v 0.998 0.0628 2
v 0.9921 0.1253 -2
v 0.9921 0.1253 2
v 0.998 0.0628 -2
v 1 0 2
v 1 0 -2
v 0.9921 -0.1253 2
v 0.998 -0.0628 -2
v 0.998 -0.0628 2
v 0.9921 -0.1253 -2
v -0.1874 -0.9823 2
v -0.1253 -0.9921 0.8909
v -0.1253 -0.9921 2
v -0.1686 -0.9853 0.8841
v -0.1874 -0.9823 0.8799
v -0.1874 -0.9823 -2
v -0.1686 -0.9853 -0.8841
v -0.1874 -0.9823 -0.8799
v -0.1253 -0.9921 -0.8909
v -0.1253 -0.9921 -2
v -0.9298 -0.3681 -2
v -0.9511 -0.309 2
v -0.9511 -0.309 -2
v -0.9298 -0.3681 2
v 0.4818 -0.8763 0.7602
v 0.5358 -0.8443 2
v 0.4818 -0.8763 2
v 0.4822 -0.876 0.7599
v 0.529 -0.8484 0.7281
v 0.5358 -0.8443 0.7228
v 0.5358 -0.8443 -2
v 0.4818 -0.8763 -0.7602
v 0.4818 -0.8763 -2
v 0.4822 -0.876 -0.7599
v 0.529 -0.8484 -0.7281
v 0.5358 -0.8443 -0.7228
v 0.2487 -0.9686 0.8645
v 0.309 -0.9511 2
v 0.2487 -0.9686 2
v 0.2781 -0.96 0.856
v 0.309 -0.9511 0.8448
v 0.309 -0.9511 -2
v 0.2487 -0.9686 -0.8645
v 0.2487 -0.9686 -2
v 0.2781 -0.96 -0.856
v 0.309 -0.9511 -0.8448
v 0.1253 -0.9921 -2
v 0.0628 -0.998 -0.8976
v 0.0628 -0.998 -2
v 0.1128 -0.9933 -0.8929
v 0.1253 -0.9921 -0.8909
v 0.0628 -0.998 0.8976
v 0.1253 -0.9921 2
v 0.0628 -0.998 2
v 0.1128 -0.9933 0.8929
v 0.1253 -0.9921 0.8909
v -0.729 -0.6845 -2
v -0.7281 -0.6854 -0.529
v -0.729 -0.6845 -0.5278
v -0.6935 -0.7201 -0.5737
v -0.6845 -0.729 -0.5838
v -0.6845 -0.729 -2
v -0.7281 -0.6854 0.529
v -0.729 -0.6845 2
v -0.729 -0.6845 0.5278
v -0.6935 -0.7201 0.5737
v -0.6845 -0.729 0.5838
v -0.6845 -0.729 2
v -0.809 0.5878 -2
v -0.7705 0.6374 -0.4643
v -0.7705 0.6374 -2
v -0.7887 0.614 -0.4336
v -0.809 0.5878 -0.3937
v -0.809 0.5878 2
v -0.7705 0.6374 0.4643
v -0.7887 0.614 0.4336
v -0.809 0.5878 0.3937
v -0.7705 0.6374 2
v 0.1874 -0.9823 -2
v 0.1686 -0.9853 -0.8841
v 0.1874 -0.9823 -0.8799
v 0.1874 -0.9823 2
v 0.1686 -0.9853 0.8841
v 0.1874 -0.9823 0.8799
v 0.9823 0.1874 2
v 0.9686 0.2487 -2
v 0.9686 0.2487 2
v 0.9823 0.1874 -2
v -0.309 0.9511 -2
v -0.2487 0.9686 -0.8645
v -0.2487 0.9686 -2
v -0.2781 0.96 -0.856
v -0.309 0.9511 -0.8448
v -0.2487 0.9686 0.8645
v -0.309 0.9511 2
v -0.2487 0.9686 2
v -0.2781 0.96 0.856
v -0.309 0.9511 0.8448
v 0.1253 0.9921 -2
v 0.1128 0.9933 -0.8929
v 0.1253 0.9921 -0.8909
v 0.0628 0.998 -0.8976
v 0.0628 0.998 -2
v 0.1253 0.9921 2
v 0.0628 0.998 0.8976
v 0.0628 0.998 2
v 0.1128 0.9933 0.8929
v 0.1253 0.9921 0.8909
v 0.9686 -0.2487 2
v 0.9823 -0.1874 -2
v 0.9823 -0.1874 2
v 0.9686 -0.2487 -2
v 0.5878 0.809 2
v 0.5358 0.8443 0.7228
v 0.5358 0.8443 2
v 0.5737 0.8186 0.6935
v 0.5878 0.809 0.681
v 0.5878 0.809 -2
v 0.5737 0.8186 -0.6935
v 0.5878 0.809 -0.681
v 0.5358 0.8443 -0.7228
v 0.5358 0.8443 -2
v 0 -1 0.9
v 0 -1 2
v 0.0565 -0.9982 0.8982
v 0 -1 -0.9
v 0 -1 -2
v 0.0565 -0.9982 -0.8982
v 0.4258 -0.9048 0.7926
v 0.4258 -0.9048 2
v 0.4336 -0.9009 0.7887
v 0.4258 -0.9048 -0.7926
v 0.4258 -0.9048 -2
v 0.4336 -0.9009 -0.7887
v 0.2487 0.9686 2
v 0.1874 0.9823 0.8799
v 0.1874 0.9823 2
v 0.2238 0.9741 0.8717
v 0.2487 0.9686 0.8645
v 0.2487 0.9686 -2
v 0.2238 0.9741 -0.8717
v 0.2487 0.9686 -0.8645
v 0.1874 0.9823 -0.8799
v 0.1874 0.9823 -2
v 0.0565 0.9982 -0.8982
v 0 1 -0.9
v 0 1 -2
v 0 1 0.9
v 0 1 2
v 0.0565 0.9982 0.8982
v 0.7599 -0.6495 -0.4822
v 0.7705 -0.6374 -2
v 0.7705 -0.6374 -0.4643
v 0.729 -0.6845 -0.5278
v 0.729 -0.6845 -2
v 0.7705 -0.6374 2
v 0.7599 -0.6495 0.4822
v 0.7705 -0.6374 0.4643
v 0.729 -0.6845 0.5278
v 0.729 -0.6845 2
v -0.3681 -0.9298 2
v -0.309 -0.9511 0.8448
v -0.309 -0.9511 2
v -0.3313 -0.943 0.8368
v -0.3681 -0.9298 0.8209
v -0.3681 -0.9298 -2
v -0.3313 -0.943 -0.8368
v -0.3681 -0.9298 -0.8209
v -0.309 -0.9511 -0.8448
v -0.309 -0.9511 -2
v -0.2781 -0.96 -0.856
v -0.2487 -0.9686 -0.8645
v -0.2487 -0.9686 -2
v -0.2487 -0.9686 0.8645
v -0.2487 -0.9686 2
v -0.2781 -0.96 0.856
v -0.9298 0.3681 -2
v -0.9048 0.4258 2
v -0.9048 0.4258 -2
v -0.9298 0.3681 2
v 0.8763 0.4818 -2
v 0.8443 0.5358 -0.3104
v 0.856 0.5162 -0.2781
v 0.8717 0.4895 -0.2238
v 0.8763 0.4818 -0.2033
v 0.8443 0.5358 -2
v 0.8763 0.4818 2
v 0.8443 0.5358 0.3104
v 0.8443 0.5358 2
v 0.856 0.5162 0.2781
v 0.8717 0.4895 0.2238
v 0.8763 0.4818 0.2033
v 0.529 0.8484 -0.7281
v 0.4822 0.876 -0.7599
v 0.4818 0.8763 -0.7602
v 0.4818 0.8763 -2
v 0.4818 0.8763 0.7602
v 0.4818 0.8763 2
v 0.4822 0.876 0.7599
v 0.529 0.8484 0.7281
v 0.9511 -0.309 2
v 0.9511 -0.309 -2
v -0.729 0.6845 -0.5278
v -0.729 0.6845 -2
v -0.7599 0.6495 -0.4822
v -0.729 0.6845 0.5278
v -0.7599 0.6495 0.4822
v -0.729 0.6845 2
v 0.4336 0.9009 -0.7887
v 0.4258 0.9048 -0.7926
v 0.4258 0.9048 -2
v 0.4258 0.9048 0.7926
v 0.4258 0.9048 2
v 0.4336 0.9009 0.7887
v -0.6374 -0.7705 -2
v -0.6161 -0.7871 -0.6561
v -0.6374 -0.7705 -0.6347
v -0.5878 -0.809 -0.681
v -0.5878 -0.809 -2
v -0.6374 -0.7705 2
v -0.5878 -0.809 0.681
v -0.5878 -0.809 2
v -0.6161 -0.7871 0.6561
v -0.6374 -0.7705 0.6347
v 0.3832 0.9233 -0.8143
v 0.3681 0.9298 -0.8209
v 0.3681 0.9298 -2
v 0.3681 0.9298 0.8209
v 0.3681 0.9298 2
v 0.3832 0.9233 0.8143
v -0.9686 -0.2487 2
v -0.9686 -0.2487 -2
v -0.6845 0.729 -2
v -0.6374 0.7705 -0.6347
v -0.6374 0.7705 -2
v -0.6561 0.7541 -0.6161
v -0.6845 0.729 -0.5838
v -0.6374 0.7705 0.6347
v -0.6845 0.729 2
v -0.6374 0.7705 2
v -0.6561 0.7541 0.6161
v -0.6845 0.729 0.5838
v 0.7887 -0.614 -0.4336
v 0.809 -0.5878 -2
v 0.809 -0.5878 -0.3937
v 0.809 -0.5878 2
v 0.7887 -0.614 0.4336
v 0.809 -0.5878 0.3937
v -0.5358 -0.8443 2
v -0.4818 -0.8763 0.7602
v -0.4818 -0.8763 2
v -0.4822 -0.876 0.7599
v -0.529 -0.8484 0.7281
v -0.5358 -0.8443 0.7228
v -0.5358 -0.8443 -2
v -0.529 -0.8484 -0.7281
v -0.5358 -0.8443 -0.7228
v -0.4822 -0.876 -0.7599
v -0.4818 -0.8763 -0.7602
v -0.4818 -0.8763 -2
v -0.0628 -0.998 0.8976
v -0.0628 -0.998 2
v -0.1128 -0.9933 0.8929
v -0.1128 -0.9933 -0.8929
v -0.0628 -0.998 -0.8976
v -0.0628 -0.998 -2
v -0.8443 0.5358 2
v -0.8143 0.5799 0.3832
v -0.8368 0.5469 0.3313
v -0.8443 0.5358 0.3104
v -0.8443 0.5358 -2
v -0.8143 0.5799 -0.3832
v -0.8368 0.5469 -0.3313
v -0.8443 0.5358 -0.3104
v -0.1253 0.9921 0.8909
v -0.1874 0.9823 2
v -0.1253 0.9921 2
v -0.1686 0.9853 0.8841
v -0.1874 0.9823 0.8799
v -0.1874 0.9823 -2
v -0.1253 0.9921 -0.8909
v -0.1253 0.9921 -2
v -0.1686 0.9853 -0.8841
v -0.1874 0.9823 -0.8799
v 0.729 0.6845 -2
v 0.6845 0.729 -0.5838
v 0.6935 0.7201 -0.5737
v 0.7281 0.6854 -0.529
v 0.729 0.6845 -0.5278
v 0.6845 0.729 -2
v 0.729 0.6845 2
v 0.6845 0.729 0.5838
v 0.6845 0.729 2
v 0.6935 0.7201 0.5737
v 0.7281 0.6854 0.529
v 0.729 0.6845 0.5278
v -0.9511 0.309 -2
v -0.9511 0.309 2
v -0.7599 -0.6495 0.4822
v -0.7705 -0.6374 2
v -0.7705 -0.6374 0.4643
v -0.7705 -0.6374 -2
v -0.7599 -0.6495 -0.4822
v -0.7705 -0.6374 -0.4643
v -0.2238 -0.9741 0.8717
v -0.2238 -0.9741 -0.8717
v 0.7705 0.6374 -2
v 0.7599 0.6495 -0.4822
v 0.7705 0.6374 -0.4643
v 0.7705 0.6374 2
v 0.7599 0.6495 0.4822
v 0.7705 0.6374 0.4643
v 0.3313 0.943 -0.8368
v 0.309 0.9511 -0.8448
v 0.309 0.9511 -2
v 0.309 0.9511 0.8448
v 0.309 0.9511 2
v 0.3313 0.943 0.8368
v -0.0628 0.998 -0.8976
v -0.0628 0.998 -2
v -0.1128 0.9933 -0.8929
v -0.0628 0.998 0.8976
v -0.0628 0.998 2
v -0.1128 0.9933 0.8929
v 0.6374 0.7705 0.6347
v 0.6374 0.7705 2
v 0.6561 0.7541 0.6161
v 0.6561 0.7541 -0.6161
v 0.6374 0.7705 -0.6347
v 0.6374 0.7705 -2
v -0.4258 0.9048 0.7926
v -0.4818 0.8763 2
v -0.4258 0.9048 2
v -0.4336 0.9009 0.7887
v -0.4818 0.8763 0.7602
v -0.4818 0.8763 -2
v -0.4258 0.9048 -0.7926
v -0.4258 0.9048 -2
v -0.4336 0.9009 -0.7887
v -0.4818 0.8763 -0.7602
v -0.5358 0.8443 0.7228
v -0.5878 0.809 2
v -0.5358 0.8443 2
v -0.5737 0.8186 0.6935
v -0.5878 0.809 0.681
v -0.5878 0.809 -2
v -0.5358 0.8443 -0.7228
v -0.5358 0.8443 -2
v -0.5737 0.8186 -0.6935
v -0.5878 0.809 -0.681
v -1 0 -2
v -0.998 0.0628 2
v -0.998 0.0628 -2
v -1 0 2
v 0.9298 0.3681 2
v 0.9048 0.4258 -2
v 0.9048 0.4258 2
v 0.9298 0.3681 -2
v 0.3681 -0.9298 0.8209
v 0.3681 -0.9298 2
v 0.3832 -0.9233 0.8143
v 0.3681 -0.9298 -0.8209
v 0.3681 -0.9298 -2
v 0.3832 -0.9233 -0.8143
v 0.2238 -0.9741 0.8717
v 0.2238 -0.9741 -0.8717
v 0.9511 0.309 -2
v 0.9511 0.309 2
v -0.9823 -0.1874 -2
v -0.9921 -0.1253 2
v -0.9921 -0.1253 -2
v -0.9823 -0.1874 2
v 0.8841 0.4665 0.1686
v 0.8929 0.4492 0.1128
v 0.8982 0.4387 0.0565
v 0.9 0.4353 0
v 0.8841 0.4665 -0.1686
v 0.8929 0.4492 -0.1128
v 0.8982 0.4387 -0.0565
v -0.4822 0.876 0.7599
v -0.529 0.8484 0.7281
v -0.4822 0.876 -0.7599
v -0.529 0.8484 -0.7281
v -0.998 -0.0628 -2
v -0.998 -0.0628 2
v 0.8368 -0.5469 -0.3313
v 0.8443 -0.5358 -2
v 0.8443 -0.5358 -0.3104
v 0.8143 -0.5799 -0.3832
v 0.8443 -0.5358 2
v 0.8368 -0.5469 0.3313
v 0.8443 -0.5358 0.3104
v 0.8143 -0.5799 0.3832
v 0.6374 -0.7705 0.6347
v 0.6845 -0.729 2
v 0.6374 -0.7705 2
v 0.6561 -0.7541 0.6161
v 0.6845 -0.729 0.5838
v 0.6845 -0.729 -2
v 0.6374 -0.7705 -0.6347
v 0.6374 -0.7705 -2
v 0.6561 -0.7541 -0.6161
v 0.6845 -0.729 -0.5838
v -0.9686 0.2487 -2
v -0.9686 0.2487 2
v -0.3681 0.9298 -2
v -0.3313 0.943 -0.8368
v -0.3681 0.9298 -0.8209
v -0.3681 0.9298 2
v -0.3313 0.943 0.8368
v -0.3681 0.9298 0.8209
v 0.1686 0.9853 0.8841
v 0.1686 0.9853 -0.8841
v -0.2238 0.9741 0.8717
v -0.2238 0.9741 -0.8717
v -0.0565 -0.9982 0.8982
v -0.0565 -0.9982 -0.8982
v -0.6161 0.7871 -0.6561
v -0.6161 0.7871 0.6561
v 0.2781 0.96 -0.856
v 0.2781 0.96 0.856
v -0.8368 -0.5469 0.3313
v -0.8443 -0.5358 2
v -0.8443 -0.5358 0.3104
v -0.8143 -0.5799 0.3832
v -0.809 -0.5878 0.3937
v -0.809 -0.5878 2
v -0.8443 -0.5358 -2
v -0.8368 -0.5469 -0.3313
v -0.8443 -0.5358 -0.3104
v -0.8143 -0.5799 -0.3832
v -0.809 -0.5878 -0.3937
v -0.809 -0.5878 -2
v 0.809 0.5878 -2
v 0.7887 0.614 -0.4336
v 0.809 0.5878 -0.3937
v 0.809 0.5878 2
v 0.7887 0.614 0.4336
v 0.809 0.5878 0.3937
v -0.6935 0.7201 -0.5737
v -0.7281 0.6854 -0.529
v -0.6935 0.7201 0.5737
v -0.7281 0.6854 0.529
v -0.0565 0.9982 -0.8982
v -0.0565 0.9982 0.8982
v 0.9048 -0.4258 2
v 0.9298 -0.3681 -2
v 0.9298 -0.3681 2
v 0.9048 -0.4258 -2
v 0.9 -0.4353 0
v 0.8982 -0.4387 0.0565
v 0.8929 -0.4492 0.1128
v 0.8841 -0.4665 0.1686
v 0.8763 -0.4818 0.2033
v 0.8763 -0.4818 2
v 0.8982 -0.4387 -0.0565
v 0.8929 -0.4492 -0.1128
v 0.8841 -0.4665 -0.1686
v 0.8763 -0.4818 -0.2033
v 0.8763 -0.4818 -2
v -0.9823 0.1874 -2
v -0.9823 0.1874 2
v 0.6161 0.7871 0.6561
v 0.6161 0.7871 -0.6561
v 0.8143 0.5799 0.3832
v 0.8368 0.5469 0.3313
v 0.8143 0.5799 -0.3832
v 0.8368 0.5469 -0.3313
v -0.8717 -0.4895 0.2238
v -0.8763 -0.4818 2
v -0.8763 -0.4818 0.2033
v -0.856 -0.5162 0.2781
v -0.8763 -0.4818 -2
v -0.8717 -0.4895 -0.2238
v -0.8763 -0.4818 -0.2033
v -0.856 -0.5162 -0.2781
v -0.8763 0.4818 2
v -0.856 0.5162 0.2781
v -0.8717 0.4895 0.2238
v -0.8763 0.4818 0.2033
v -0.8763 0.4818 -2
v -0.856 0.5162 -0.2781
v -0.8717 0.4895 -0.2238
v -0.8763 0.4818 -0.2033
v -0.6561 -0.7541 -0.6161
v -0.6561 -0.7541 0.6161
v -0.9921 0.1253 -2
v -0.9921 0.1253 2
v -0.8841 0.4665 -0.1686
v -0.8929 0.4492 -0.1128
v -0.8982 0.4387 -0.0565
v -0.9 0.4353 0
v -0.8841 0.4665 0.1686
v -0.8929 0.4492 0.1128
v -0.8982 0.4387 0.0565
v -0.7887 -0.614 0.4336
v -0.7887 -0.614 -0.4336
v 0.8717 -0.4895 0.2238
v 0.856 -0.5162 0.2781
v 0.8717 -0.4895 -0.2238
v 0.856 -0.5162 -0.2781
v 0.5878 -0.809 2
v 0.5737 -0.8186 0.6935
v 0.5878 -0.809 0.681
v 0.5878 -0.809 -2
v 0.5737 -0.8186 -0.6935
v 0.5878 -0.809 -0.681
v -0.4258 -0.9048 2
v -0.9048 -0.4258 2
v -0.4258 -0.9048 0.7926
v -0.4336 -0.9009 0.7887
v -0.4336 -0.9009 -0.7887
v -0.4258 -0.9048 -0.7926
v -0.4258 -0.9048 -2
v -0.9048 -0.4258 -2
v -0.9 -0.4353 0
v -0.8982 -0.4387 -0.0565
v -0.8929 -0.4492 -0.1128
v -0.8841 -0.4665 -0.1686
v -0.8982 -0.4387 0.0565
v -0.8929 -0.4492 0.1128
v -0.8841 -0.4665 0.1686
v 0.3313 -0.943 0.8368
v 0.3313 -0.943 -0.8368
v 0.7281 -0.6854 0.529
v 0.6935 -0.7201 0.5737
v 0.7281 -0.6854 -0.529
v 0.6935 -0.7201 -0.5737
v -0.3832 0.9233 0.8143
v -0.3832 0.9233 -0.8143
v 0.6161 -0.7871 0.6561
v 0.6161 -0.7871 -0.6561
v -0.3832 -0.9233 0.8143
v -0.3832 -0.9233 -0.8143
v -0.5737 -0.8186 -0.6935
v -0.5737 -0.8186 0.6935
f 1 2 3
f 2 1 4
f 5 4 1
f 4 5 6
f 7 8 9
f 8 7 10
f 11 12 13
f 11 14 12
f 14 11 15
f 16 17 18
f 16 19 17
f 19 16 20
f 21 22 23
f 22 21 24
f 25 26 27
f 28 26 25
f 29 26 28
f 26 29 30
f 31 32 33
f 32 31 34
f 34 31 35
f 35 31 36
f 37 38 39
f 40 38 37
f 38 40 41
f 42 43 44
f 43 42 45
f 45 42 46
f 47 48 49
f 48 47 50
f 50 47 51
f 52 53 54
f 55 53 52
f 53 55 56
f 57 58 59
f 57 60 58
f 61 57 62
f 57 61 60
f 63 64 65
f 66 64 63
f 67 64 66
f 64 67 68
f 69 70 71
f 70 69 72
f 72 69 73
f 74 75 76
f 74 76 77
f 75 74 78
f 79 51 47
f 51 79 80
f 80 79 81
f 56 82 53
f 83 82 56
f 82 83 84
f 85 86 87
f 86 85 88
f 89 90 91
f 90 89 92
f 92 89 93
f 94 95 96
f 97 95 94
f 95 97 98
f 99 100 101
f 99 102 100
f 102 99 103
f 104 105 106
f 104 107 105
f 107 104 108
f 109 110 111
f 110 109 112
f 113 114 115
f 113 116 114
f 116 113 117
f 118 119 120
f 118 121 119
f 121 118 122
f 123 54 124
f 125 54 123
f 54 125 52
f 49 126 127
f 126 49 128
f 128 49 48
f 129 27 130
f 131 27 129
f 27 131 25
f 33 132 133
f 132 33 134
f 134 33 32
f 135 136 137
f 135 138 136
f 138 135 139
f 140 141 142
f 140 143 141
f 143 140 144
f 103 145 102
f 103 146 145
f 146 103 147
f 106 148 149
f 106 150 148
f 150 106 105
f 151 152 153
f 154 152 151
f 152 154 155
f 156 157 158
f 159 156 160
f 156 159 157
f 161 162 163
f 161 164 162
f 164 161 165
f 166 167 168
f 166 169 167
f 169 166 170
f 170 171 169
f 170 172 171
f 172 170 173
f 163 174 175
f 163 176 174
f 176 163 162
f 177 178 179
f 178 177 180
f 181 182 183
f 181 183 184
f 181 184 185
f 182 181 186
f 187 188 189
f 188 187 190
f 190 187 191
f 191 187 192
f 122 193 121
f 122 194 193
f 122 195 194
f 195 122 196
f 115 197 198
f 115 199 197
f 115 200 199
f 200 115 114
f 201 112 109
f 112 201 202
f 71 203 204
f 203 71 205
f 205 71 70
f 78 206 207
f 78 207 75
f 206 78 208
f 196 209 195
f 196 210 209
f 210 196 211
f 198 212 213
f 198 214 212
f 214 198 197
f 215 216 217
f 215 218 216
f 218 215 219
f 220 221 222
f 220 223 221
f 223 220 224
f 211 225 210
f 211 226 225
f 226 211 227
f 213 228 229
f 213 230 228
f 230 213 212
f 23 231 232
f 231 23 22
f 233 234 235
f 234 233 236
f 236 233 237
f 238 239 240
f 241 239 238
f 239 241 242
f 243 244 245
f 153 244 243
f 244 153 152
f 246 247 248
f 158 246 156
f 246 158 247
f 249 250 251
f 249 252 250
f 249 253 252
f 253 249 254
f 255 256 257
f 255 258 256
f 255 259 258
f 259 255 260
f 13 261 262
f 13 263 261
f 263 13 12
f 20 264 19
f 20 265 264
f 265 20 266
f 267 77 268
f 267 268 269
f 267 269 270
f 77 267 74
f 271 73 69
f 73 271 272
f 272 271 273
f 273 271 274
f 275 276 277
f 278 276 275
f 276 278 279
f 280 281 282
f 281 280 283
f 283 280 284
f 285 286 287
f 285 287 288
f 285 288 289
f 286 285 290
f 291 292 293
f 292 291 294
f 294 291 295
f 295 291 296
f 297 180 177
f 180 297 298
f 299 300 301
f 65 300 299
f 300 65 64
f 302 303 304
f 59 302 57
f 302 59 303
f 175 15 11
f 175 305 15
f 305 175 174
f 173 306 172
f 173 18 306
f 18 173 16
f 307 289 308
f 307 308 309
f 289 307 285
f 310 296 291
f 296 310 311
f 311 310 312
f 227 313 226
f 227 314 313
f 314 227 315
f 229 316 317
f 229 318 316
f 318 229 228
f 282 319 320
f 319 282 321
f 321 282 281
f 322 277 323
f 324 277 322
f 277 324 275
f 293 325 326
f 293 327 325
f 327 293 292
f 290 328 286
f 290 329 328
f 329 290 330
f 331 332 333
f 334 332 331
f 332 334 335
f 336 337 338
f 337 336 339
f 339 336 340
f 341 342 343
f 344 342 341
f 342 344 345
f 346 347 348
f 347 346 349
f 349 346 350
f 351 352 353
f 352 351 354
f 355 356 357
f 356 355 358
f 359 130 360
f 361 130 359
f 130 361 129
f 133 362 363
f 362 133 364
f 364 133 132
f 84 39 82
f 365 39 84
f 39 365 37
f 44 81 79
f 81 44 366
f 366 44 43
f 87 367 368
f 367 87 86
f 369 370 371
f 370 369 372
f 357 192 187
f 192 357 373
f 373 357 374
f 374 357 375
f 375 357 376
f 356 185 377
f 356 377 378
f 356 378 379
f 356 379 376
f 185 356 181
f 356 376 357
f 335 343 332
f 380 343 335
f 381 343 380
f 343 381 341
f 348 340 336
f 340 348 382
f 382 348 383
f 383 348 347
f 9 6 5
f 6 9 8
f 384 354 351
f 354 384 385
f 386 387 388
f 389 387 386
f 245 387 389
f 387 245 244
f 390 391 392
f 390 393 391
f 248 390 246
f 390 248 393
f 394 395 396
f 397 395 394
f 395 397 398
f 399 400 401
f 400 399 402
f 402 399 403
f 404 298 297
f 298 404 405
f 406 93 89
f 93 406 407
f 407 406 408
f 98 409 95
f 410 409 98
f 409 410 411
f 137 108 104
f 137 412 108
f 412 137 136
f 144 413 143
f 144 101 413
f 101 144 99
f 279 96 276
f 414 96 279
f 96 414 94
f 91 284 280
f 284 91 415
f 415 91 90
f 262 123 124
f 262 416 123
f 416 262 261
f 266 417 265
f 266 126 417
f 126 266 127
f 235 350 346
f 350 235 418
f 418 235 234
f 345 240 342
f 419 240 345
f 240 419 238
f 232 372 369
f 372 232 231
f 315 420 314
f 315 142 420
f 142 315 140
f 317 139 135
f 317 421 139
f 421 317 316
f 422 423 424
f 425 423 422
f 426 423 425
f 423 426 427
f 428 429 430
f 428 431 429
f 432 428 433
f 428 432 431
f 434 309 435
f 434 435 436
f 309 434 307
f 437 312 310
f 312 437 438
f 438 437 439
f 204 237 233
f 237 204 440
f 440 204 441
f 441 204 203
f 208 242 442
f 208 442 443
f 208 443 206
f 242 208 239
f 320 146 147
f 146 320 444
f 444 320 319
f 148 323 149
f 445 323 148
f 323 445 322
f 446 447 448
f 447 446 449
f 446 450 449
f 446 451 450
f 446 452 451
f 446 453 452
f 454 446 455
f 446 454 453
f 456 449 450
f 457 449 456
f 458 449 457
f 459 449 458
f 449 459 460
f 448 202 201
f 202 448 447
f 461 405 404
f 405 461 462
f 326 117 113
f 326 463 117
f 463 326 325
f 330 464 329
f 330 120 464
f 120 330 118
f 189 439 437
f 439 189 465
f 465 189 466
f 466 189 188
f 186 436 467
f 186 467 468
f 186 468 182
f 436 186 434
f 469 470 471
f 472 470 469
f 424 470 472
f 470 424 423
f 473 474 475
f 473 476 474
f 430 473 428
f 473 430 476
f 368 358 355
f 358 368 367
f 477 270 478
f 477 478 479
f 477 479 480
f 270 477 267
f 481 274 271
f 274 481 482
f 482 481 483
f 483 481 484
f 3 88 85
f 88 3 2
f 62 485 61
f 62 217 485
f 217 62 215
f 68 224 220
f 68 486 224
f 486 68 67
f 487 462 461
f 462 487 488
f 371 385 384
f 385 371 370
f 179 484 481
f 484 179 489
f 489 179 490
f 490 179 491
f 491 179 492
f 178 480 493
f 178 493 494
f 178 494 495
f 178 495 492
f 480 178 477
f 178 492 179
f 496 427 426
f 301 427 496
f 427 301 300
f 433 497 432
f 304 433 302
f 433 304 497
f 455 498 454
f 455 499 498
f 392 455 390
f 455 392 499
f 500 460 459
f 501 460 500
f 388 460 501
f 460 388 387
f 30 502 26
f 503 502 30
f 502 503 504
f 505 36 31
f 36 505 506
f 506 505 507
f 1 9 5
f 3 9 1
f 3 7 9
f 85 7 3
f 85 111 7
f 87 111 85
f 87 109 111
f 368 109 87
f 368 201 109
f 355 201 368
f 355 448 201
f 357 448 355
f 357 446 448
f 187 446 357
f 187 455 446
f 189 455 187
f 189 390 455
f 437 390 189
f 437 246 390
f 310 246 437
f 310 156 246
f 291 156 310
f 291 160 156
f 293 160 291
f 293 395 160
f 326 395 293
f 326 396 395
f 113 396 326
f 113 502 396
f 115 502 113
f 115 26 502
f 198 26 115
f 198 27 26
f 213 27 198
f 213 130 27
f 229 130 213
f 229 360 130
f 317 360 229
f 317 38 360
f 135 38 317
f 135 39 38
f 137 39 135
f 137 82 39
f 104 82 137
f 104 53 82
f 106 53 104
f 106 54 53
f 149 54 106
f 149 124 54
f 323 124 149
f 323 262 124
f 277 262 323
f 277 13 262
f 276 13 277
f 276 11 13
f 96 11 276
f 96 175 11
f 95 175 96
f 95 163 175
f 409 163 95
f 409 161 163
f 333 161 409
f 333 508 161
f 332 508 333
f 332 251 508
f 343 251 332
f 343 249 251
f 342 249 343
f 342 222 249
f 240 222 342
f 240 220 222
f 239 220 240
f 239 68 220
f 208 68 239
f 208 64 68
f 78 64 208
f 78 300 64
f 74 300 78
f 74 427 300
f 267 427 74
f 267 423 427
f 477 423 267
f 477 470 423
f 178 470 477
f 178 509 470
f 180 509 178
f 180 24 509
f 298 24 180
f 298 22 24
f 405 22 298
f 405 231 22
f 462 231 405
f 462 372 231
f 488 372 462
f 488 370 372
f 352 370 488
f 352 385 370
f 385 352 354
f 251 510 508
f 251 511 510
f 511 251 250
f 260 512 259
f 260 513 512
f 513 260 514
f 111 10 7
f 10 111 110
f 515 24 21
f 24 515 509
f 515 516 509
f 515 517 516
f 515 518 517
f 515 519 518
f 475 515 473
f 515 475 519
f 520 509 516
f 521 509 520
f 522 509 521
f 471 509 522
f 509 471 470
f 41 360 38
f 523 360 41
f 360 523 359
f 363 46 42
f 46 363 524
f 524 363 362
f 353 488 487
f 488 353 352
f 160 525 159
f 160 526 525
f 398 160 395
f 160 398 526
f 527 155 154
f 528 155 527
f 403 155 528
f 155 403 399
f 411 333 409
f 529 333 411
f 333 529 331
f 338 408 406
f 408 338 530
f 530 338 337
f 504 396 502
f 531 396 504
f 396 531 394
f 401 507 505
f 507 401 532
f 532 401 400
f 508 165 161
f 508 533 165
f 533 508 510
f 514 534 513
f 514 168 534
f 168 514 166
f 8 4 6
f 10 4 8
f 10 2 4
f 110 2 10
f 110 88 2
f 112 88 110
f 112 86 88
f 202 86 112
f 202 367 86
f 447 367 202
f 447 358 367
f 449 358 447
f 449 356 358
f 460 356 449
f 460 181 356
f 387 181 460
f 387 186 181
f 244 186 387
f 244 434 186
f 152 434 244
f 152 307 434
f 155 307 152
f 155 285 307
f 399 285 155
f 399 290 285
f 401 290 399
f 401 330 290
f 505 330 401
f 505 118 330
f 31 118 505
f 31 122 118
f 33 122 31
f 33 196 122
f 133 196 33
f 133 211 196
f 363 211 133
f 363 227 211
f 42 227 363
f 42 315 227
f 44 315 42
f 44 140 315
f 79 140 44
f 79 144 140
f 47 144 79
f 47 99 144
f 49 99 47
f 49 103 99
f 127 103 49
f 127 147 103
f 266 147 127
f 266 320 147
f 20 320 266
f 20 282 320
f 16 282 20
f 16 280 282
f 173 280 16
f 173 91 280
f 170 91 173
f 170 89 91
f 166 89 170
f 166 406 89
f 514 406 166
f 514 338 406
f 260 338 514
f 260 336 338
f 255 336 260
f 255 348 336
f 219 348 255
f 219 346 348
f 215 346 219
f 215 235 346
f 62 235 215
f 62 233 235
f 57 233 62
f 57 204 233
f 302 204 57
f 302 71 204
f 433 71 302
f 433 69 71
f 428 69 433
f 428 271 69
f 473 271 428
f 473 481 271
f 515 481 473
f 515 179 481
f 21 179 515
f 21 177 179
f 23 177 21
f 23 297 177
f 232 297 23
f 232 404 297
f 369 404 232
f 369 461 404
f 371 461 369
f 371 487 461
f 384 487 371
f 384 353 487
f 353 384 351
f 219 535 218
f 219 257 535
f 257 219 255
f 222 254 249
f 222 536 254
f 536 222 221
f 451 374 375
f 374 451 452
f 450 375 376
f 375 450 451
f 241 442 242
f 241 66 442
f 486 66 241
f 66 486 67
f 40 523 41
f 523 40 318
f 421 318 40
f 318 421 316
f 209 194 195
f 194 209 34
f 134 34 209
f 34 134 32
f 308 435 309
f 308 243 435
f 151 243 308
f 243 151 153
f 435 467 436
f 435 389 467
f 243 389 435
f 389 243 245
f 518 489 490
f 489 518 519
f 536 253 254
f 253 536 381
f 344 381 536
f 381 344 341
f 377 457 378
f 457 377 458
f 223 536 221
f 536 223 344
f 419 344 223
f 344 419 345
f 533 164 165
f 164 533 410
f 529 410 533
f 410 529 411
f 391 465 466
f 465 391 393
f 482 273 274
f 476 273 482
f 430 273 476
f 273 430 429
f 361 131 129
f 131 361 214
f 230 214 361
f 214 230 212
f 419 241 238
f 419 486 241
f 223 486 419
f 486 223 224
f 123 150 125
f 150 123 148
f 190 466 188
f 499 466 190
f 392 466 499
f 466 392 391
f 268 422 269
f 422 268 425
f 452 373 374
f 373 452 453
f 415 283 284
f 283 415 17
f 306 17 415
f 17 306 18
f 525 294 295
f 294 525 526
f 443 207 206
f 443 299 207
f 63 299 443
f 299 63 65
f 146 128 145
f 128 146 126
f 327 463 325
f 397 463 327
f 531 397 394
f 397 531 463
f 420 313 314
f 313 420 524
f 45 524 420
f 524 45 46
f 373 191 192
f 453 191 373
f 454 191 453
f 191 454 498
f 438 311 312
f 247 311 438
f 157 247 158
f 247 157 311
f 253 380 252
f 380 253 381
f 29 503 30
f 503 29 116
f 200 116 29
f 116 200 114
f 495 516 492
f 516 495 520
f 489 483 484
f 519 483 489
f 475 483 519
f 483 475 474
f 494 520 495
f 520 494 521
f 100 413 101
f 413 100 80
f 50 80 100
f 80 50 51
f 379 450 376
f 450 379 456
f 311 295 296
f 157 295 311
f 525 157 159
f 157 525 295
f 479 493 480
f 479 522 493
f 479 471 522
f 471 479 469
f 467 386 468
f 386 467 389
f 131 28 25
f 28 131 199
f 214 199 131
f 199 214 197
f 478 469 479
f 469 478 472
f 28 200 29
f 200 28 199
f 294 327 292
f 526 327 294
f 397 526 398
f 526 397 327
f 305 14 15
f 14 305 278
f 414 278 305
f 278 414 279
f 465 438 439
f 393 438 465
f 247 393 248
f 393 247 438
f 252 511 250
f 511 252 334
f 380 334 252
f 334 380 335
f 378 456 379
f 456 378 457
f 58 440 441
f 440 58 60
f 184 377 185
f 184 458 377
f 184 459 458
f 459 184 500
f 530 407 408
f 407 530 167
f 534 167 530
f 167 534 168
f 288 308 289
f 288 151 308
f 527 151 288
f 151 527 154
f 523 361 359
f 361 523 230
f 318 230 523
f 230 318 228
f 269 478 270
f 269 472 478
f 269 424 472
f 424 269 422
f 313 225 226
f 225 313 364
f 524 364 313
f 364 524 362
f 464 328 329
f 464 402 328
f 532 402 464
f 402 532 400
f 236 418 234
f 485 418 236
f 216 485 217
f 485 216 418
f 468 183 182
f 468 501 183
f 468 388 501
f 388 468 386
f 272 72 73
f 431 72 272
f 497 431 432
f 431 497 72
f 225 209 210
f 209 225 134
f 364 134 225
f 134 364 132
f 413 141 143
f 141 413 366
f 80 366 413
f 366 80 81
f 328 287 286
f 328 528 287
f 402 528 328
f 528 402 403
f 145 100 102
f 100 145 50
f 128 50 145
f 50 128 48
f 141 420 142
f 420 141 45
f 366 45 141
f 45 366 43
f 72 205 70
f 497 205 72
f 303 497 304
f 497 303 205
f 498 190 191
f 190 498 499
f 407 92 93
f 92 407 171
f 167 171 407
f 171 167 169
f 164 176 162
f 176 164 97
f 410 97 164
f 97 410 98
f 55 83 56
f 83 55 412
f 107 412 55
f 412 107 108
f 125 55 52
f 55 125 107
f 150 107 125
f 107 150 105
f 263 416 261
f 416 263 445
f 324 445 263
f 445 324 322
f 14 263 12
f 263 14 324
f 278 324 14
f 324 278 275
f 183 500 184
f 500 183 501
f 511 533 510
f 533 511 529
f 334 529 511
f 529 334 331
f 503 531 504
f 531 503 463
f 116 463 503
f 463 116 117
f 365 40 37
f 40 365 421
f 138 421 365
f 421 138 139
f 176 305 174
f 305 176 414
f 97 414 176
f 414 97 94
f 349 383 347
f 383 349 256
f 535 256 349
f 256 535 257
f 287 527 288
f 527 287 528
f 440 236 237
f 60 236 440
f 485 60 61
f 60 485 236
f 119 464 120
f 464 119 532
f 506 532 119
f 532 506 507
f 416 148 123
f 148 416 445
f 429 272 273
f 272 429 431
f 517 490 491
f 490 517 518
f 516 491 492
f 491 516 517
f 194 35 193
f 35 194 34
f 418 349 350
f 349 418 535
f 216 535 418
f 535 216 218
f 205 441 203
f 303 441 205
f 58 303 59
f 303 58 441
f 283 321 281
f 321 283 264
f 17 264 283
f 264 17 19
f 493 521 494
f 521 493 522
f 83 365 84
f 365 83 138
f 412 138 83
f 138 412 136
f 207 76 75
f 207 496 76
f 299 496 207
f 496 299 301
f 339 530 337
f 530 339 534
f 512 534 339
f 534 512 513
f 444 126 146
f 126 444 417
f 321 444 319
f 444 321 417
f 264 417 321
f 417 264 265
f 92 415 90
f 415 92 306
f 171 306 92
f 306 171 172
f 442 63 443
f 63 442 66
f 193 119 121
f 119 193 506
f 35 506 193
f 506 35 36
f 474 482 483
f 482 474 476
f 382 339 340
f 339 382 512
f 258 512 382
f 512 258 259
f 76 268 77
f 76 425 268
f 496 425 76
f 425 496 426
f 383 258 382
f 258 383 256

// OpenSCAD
// Unit of length: Unit.MM
difference()
{
   cylinder(h = 4.0, r = 1.0, center = true, $fn = 100);
   rotate(a = [90.0, 0.0, 0.0])
   {
      cylinder(h = 4.0, r = 0.9, center = true, $fn = 100);
   }
}
